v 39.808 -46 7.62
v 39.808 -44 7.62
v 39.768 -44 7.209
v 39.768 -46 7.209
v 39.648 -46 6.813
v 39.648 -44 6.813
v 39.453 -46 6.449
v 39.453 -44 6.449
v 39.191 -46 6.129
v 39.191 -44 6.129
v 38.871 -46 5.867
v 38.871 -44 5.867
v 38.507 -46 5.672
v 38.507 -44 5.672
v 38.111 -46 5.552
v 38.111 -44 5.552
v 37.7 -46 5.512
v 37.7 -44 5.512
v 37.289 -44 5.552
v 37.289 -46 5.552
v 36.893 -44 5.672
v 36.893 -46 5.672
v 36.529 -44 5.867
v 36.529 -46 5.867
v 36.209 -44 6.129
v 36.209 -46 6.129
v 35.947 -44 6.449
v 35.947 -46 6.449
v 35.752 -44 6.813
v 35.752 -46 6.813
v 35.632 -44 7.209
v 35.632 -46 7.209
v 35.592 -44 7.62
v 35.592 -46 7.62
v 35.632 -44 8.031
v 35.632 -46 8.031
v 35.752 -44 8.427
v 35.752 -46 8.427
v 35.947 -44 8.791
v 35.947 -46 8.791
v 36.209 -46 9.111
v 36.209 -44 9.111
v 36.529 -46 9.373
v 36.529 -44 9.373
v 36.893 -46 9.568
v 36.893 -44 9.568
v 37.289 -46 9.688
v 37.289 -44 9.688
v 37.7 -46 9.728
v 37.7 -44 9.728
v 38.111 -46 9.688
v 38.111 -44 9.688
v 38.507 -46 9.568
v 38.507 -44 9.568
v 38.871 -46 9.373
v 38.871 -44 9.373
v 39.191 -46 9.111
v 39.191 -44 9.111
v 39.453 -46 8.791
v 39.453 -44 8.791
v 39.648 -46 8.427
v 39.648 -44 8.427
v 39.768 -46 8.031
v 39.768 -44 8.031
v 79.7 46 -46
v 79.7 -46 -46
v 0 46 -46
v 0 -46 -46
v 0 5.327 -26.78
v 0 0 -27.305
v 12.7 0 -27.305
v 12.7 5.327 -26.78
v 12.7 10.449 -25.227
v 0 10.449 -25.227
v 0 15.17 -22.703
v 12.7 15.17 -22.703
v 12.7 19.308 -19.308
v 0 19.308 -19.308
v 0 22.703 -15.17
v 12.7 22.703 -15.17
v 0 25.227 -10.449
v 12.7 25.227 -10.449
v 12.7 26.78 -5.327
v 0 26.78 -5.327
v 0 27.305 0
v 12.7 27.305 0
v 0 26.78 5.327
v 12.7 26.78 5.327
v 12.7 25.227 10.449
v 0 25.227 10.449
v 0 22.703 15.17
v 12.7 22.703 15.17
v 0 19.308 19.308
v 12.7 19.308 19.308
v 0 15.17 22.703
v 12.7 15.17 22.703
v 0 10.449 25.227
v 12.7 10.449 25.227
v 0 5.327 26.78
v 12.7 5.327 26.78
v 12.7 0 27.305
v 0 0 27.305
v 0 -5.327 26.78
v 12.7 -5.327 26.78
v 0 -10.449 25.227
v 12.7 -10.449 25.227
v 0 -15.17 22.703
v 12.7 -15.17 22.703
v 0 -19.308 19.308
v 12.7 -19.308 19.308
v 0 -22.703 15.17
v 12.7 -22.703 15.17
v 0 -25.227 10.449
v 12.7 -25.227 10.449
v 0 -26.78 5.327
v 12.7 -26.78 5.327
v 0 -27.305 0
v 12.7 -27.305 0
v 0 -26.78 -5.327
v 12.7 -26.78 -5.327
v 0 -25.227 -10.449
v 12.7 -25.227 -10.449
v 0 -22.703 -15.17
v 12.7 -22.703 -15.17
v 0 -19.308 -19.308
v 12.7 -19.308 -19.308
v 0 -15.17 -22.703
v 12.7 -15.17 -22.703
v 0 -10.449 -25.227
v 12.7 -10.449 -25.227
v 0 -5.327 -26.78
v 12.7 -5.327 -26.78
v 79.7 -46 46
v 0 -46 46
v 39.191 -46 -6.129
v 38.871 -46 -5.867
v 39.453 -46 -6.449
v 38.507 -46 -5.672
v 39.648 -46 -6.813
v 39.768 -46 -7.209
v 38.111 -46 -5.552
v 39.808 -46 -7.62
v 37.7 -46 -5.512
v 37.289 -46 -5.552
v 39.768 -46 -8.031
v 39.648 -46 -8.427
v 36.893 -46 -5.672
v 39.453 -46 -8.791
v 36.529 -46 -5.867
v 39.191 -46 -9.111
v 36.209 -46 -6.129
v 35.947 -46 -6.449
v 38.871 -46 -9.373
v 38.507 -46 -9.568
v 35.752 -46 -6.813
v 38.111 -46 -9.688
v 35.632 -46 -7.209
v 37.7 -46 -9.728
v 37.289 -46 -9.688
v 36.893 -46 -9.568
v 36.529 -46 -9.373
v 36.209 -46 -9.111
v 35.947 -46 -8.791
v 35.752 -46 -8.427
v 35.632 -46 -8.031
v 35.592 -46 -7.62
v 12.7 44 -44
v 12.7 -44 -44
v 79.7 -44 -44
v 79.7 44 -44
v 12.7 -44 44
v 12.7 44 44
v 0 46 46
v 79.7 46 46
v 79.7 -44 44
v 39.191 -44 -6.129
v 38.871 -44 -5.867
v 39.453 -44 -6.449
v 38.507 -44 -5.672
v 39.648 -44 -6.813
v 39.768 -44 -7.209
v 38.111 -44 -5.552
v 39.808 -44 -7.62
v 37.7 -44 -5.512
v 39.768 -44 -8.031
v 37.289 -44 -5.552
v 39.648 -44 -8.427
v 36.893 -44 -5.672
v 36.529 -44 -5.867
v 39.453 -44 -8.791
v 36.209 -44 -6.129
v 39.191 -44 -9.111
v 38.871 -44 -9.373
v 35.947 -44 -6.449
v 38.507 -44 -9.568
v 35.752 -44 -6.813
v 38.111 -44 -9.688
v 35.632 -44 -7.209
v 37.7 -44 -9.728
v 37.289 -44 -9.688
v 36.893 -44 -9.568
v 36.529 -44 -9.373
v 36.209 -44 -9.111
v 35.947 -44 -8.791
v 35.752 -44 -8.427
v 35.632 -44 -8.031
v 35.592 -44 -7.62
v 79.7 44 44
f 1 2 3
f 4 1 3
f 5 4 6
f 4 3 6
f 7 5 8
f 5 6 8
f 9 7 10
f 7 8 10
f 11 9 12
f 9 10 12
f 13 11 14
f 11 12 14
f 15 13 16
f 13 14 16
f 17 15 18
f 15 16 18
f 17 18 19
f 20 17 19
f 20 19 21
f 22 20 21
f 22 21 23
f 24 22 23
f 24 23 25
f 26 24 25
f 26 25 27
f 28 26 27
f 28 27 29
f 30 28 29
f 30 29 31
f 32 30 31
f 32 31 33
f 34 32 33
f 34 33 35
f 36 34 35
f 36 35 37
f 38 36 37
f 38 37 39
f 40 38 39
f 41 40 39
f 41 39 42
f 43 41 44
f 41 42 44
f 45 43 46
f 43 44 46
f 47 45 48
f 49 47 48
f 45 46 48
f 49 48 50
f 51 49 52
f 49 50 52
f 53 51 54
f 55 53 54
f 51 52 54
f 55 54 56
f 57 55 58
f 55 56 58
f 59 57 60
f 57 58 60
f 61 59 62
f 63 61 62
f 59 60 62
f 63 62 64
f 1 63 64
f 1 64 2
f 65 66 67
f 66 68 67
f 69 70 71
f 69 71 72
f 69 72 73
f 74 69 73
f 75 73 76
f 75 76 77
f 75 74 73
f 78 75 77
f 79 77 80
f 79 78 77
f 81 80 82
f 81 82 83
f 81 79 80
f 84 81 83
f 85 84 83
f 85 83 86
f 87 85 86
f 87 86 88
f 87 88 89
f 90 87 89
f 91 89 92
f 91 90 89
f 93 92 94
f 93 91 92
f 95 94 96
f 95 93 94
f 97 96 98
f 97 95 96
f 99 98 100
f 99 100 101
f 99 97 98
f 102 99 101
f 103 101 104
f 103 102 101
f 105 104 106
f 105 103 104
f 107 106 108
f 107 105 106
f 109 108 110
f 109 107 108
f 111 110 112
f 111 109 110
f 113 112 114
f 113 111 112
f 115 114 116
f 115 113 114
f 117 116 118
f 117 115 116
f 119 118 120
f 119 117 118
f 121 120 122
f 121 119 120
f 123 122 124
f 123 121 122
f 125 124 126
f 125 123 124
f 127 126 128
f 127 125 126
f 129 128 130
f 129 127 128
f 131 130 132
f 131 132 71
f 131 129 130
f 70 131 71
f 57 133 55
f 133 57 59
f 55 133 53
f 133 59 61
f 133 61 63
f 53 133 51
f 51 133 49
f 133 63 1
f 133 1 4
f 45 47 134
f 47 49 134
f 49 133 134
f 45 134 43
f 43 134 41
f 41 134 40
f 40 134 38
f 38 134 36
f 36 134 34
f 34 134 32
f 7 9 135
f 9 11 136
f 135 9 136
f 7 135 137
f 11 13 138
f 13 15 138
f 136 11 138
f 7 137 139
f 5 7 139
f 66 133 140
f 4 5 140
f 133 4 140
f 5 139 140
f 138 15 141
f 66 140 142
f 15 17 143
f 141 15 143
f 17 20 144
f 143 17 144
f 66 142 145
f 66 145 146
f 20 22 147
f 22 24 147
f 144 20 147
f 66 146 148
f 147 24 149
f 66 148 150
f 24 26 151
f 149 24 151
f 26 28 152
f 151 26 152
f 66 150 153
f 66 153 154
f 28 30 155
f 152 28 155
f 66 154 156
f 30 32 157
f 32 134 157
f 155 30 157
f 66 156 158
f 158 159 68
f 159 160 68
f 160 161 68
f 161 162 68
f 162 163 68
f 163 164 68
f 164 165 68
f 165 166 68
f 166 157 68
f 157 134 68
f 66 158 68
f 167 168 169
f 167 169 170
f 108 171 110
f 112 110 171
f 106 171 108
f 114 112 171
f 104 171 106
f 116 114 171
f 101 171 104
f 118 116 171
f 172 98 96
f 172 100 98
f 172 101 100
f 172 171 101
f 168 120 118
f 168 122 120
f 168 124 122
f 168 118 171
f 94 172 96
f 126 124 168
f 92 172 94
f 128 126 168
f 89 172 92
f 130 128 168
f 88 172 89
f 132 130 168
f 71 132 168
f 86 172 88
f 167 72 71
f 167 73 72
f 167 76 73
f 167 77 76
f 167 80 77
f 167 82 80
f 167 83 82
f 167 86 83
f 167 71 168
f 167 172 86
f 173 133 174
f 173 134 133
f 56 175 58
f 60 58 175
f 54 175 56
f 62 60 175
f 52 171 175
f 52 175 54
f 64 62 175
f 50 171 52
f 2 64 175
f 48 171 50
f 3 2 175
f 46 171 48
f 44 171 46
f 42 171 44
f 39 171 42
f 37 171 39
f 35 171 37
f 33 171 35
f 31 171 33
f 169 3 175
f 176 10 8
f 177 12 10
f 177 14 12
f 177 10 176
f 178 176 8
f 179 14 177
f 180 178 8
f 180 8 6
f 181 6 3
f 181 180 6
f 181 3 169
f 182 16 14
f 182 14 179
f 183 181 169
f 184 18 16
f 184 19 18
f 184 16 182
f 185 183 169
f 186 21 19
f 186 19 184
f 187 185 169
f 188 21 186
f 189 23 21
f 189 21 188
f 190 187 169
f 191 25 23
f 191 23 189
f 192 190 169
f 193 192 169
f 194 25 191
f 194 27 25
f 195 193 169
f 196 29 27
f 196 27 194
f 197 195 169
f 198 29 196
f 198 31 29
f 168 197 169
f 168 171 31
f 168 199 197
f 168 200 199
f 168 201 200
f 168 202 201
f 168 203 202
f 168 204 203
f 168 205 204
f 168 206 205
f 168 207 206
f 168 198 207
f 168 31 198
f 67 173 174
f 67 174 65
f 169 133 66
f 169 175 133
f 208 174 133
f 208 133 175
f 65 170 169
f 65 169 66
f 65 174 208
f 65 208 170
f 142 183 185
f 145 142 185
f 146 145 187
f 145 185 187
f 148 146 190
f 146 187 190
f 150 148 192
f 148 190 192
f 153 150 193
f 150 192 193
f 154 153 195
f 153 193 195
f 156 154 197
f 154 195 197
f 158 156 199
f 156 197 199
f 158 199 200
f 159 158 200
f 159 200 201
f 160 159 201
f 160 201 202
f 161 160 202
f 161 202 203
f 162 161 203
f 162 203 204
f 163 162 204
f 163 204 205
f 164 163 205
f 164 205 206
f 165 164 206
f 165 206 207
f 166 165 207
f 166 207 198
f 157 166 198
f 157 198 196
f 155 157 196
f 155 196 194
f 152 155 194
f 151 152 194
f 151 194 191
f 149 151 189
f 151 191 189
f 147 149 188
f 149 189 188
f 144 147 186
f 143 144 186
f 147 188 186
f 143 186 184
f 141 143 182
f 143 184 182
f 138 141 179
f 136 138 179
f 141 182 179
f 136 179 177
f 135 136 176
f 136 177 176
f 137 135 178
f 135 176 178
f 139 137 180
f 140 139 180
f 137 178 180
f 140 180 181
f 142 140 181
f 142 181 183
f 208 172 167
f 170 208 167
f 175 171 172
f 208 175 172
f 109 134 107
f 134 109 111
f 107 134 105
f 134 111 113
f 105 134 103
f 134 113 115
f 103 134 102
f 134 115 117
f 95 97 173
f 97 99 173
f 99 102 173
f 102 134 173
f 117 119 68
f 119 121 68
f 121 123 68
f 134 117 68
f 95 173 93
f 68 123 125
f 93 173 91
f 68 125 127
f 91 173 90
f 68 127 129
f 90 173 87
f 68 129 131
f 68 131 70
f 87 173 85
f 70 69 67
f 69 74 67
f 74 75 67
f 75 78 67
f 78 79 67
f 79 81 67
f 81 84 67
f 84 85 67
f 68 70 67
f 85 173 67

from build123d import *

# Parameters (mm, degrees)
SKETCH1_W                       = 92
SKETCH1_H                       = 92
SKETCH1_W_2                     = 88
SKETCH1_H_2                     = 88
SKETCH1_R                       = 27.305
BOSS_EXTRUDE1_DEPTH             = 12.7
SKETCH2_W                       = 92
SKETCH2_H                       = 92
SKETCH2_W_2                     = 88
SKETCH2_H_2                     = 88
BOSS_EXTRUDE2_DEPTH             = 67
F_19_0_166_DIAMETER_HOLE1_D     = 4.2164
F_19_0_166_DIAMETER_HOLE1_DEPTH = 2


with BuildPart() as part:
    # Sketch1 → Boss-Extrude1 (new body)
    # profile 1 of 2: a face of its own
    with BuildSketch(Plane(origin=(0, 0, 0), x_dir=(0, 0, -1), z_dir=(1, 0, 0))):
        Rectangle(SKETCH1_W, SKETCH1_H)
        Rectangle(SKETCH1_W_2, SKETCH1_H_2, mode=Mode.SUBTRACT)
    # profile 2 of 2: a face of its own
    with BuildSketch(Plane(origin=(0, 0, 0), x_dir=(0, 0, -1), z_dir=(1, 0, 0))):
        Rectangle(SKETCH1_W_2, SKETCH1_H_2)
        Circle(SKETCH1_R, mode=Mode.SUBTRACT)
    extrude(amount=BOSS_EXTRUDE1_DEPTH)

    # Sketch2 → Boss-Extrude2 (add)
    with BuildSketch(Plane(origin=(12.7, 0, 0), x_dir=(0, 0, -1), z_dir=(1, 0, 0))):
        Rectangle(SKETCH2_W, SKETCH2_H)
        Rectangle(SKETCH2_W_2, SKETCH2_H_2, mode=Mode.SUBTRACT)
    extrude(amount=BOSS_EXTRUDE2_DEPTH)

    # #19 (0.166) Diameter Hole1
    with Locations(Plane(origin=(0, -46, 0), x_dir=(-1, 0, 0), z_dir=(0, -1, 0))):
        with Locations((-37.7, 7.62), (-37.7, -7.62), (17.600686592, 72.613770274), (-57.973181852, -74.350642439), (-79.7, -100.115693871), (-40.410274663, -84.366152369)):
            Hole(F_19_0_166_DIAMETER_HOLE1_D / 2, depth=F_19_0_166_DIAMETER_HOLE1_DEPTH)


solid = part.part
